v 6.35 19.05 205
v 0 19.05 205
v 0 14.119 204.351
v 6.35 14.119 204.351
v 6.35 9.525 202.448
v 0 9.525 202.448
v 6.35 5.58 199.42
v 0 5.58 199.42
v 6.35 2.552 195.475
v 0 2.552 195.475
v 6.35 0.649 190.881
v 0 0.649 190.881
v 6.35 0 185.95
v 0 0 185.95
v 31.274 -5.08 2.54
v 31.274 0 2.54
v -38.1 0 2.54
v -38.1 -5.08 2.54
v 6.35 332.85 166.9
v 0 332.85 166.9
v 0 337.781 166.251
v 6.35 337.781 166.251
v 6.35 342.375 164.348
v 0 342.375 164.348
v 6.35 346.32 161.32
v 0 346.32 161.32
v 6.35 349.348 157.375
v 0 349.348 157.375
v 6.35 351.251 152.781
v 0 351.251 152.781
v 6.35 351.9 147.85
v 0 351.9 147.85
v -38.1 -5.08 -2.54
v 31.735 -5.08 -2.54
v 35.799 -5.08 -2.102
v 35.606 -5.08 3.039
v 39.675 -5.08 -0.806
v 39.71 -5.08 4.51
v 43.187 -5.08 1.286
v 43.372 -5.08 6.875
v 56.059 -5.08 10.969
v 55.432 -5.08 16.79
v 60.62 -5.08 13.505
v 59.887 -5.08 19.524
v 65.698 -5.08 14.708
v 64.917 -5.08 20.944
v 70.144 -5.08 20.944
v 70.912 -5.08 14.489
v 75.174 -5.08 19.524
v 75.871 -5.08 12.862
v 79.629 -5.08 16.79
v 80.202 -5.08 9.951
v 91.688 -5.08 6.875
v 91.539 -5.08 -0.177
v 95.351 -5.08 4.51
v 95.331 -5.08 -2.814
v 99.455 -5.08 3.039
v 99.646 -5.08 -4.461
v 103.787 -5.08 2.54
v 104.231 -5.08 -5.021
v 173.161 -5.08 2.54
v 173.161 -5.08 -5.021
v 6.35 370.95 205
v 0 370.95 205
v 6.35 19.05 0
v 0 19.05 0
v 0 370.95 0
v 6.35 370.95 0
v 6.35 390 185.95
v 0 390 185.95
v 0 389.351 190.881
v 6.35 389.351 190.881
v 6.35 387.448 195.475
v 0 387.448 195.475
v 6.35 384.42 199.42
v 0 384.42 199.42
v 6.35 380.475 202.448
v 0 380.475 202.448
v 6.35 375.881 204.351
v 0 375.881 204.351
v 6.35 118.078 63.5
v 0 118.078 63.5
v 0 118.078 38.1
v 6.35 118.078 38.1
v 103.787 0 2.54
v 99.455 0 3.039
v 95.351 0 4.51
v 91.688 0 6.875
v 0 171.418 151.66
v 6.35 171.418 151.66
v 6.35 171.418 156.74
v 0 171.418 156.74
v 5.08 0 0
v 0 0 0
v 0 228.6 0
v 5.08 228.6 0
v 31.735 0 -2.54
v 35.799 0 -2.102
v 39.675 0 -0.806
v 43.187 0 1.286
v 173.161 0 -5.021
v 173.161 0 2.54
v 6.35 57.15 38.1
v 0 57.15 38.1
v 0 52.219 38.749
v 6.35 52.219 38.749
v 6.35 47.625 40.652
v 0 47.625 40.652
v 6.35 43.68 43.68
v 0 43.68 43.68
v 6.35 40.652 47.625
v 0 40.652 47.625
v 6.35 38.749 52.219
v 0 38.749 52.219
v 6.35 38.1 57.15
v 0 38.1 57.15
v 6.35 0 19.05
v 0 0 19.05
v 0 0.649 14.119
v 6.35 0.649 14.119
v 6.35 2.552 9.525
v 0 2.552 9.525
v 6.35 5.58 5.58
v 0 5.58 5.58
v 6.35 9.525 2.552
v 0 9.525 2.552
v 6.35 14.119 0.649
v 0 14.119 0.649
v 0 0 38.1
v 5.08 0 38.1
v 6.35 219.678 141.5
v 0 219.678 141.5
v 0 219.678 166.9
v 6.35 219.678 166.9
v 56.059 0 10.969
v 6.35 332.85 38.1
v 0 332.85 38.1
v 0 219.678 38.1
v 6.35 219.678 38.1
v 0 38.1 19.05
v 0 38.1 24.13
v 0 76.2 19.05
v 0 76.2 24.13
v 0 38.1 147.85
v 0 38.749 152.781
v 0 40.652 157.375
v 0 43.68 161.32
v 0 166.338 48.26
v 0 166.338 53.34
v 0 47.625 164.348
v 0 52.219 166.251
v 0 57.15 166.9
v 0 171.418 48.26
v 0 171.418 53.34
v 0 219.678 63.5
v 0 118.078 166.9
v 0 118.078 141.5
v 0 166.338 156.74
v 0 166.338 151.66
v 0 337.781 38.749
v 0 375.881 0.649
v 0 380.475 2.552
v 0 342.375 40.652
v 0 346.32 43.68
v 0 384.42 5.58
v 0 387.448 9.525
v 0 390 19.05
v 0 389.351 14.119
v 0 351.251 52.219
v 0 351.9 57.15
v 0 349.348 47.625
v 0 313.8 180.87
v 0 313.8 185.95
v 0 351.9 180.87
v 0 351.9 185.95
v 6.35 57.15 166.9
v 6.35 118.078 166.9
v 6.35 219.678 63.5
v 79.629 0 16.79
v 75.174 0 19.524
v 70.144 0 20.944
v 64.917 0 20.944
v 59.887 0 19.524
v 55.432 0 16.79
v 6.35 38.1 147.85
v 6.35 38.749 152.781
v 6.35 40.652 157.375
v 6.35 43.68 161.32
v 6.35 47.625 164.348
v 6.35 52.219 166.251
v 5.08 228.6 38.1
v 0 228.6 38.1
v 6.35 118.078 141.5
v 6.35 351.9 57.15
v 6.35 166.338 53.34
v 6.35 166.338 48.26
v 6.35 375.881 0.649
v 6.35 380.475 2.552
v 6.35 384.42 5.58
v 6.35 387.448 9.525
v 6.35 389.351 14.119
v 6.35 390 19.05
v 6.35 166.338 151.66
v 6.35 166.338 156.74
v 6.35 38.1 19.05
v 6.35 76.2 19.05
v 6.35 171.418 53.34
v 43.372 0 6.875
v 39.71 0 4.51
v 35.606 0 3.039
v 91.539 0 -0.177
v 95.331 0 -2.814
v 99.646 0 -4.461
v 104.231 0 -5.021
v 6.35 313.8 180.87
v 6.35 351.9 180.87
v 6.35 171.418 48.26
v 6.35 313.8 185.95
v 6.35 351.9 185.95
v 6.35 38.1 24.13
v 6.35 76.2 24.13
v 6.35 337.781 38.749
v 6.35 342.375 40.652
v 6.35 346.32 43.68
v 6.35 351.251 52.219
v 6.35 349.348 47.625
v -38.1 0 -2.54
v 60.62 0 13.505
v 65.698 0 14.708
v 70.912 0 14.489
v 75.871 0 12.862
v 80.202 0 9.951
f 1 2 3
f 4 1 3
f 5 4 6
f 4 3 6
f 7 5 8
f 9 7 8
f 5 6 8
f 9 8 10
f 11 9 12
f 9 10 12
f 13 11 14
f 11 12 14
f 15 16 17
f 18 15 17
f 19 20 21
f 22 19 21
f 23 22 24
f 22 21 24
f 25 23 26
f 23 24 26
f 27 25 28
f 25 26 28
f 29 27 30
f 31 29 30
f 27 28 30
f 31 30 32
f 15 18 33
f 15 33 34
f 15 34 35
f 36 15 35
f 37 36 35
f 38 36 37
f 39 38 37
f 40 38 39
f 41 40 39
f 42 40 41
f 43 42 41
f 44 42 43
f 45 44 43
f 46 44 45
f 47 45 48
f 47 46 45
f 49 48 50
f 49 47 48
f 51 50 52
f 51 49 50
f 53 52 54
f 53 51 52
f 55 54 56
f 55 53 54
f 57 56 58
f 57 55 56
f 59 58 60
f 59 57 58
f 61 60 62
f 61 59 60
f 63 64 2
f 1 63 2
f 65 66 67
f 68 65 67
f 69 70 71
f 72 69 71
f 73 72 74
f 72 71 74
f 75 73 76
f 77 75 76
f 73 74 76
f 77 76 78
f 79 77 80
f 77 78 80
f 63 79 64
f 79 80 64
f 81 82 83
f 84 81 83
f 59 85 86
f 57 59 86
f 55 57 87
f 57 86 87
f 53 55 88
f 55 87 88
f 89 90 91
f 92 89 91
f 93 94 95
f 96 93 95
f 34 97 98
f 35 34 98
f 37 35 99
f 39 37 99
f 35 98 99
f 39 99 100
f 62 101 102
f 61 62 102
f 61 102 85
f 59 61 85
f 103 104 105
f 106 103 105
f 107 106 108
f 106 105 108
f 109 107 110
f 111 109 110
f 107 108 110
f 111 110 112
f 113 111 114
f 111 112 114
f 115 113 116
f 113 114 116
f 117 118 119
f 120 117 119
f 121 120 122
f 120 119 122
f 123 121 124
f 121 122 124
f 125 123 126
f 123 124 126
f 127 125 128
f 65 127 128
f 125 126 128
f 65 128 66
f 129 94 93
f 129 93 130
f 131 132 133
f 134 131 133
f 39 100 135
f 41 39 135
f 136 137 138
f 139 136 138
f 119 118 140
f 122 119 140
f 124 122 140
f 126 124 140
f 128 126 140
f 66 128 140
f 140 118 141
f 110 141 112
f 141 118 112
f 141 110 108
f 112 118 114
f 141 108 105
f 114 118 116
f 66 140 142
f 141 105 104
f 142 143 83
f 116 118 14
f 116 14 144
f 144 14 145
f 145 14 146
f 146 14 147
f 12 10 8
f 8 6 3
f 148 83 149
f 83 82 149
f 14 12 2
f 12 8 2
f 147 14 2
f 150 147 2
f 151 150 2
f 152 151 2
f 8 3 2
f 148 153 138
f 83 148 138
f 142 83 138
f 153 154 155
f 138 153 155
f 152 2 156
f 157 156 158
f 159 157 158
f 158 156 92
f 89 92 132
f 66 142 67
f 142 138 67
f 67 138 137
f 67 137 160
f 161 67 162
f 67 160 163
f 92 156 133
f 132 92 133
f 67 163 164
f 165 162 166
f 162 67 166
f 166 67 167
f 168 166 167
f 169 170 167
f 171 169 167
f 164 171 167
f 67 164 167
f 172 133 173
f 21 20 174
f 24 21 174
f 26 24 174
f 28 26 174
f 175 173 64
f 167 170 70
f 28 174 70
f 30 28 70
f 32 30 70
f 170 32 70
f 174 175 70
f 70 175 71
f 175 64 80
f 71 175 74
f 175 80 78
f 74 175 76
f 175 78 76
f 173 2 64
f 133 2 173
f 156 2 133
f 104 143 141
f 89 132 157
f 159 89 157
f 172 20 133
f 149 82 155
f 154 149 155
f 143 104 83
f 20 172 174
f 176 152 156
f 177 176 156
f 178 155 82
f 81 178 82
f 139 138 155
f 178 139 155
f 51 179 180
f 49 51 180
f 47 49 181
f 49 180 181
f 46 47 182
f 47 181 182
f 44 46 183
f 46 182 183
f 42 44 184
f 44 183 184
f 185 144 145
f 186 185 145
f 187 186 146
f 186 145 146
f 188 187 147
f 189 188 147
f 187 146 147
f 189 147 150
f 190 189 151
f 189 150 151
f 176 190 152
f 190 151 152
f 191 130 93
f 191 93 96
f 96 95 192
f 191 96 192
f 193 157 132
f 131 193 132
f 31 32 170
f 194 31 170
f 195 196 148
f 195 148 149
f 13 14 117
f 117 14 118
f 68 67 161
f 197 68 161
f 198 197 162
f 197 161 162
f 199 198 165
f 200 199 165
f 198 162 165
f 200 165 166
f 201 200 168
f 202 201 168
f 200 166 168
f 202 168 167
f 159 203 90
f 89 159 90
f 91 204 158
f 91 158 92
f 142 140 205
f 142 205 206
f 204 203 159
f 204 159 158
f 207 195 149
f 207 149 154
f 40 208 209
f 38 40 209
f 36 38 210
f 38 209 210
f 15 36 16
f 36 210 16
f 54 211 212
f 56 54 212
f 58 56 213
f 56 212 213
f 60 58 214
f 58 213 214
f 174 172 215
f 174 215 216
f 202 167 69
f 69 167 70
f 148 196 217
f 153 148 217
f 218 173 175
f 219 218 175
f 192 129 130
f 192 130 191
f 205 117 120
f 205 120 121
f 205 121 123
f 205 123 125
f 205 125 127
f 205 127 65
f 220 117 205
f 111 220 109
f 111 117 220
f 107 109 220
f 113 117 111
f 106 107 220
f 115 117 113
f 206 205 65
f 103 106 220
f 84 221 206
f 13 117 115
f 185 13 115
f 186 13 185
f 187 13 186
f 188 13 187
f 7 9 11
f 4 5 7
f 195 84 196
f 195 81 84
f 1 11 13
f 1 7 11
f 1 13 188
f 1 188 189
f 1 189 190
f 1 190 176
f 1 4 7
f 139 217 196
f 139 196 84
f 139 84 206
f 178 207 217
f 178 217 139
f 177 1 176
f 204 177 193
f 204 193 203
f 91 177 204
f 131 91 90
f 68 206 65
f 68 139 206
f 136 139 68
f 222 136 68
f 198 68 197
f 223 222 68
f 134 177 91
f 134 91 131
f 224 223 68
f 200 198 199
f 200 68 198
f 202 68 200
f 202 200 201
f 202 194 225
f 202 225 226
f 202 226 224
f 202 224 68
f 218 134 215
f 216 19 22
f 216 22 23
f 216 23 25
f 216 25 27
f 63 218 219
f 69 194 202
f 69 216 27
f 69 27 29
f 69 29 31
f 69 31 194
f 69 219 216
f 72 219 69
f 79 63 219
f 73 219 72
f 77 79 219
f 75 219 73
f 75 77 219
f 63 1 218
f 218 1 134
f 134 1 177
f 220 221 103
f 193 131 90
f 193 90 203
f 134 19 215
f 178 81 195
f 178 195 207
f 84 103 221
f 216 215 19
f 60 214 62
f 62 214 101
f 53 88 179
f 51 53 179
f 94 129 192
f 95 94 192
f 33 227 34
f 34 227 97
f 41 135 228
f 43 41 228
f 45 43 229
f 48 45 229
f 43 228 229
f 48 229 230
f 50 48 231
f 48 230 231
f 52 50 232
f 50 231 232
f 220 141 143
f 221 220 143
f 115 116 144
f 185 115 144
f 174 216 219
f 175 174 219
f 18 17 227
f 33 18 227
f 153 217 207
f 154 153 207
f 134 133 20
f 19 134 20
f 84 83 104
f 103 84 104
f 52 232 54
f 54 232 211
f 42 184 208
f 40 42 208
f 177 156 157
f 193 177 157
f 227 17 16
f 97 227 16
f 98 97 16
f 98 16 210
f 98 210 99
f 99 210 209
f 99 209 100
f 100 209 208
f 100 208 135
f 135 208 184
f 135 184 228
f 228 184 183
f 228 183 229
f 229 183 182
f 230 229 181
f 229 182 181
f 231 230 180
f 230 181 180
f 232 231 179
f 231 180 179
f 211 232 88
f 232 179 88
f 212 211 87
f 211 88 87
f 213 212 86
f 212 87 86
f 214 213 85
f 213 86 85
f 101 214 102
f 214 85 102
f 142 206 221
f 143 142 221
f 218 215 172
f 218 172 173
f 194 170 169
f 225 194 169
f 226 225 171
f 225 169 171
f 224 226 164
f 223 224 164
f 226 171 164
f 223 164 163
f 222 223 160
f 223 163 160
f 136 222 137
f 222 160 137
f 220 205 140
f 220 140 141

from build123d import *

# Parameters (mm, degrees)
F0_W     = 38.1
F0_H     = 5.08
F0_W_2   = 5.08
F1_DEPTH = 6.35
F2_W     = 228.6
F2_H     = 38.1
F3_DEPTH = 5.08
F5_DEPTH = 5.08


with BuildPart() as f1:
    # F0 (on Right) → F1 (new body)
    with BuildSketch(Plane.YZ):
        with BuildLine():
            ThreePointArc((0, 19.05), (5.579616, 5.579616), (19.05, 0))
            Line((19.05, 0), (370.95, 0))
            ThreePointArc((370.95, 0), (384.420384, 5.579616), (390, 19.05))
            Line((390, 19.05), (390, 185.95))
            ThreePointArc((390, 185.95), (384.420384, 199.420384), (370.95, 205))
            Line((370.95, 205), (19.05, 205))
            ThreePointArc((19.05, 205), (5.579616, 199.420384), (0, 185.95))
            Line((0, 185.95), (0, 19.05))
        make_face()
        with Locations((57.15, 21.59)):
            Rectangle(F0_W, F0_H, mode=Mode.SUBTRACT)
        with Locations((168.877628, 50.8)):
            Rectangle(F0_W_2, F0_H, mode=Mode.SUBTRACT)
        with Locations((168.877628, 154.2)):
            Rectangle(F0_W_2, F0_H, mode=Mode.SUBTRACT)
        with BuildLine():
            ThreePointArc((38.1, 147.85), (43.679616, 161.320384), (57.15, 166.9))
            Line((57.15, 166.9), (118.077628, 166.9))
            Line((118.077628, 166.9), (118.077628, 141.5))
            Line((118.077628, 141.5), (219.677628, 141.5))
            Line((219.677628, 141.5), (219.677628, 166.9))
            Line((219.677628, 166.9), (332.85, 166.9))
            ThreePointArc((332.85, 166.9), (346.320384, 161.320384), (351.9, 147.85))
            Line((351.9, 147.85), (351.9, 57.15))
            ThreePointArc((351.9, 57.15), (346.320384, 43.679616), (332.85, 38.1))
            Line((332.85, 38.1), (219.677628, 38.1))
            Line((219.677628, 38.1), (219.677628, 63.5))
            Line((219.677628, 63.5), (118.077628, 63.5))
            Line((118.077628, 63.5), (118.077628, 38.1))
            Line((118.077628, 38.1), (57.15, 38.1))
            ThreePointArc((57.15, 38.1), (43.679616, 43.679616), (38.1, 57.15))
            Line((38.1, 57.15), (38.1, 147.85))
        make_face(mode=Mode.SUBTRACT)
        with Locations((332.85, 183.41)):
            Rectangle(F0_W, F0_H, mode=Mode.SUBTRACT)
    extrude(amount=F1_DEPTH)


with BuildPart() as f3:
    # F2 (on Right) → F3 (new body)
    with BuildSketch(Plane.YZ):
        with Locations((114.3, 19.05)):
            Rectangle(F2_W, F2_H)
    extrude(amount=F3_DEPTH)


with BuildPart() as f5:
    # F4 (on Front) → F5 (new body)
    with BuildSketch(Plane.XZ):
        with BuildLine():
            Line((31.274364, 2.54), (-38.1, 2.54))
            Line((-38.1, 2.54), (-38.1, -2.54))
            Line((-38.1, -2.54), (31.735173, -2.54))
            ThreePointArc((31.735173, -2.54), (37.771967, -1.558194), (43.186507, 1.286024))
            Line((43.186507, 1.286024), (56.059111, 10.968677))
            ThreePointArc((56.059111, 10.968677), (68.312582, 14.777805), (80.202106, 9.951186))
            Line((80.202106, 9.951186), (91.539308, -0.17714))
            ThreePointArc((91.539308, -0.17714), (97.438733, -3.768632), (104.230969, -5.020654))
            Line((104.230969, -5.020654), (173.160924, -5.020654))
            Line((173.160924, -5.020654), (173.160924, 2.54))
            Line((173.160924, 2.54), (103.786559, 2.54))
            ThreePointArc((103.786559, 2.54), (97.360933, 3.656405), (91.688441, 6.874769))
            Line((91.688441, 6.874769), (79.628581, 16.789776))
            ThreePointArc((79.628581, 16.789776), (67.530462, 21.124545), (55.432343, 16.789776))
            Line((55.432343, 16.789776), (43.372483, 6.874769))
            ThreePointArc((43.372483, 6.874769), (37.699991, 3.656405), (31.274364, 2.54))
        make_face()
    extrude(amount=F5_DEPTH)


solid = Compound([f1.part, f3.part, f5.part])
